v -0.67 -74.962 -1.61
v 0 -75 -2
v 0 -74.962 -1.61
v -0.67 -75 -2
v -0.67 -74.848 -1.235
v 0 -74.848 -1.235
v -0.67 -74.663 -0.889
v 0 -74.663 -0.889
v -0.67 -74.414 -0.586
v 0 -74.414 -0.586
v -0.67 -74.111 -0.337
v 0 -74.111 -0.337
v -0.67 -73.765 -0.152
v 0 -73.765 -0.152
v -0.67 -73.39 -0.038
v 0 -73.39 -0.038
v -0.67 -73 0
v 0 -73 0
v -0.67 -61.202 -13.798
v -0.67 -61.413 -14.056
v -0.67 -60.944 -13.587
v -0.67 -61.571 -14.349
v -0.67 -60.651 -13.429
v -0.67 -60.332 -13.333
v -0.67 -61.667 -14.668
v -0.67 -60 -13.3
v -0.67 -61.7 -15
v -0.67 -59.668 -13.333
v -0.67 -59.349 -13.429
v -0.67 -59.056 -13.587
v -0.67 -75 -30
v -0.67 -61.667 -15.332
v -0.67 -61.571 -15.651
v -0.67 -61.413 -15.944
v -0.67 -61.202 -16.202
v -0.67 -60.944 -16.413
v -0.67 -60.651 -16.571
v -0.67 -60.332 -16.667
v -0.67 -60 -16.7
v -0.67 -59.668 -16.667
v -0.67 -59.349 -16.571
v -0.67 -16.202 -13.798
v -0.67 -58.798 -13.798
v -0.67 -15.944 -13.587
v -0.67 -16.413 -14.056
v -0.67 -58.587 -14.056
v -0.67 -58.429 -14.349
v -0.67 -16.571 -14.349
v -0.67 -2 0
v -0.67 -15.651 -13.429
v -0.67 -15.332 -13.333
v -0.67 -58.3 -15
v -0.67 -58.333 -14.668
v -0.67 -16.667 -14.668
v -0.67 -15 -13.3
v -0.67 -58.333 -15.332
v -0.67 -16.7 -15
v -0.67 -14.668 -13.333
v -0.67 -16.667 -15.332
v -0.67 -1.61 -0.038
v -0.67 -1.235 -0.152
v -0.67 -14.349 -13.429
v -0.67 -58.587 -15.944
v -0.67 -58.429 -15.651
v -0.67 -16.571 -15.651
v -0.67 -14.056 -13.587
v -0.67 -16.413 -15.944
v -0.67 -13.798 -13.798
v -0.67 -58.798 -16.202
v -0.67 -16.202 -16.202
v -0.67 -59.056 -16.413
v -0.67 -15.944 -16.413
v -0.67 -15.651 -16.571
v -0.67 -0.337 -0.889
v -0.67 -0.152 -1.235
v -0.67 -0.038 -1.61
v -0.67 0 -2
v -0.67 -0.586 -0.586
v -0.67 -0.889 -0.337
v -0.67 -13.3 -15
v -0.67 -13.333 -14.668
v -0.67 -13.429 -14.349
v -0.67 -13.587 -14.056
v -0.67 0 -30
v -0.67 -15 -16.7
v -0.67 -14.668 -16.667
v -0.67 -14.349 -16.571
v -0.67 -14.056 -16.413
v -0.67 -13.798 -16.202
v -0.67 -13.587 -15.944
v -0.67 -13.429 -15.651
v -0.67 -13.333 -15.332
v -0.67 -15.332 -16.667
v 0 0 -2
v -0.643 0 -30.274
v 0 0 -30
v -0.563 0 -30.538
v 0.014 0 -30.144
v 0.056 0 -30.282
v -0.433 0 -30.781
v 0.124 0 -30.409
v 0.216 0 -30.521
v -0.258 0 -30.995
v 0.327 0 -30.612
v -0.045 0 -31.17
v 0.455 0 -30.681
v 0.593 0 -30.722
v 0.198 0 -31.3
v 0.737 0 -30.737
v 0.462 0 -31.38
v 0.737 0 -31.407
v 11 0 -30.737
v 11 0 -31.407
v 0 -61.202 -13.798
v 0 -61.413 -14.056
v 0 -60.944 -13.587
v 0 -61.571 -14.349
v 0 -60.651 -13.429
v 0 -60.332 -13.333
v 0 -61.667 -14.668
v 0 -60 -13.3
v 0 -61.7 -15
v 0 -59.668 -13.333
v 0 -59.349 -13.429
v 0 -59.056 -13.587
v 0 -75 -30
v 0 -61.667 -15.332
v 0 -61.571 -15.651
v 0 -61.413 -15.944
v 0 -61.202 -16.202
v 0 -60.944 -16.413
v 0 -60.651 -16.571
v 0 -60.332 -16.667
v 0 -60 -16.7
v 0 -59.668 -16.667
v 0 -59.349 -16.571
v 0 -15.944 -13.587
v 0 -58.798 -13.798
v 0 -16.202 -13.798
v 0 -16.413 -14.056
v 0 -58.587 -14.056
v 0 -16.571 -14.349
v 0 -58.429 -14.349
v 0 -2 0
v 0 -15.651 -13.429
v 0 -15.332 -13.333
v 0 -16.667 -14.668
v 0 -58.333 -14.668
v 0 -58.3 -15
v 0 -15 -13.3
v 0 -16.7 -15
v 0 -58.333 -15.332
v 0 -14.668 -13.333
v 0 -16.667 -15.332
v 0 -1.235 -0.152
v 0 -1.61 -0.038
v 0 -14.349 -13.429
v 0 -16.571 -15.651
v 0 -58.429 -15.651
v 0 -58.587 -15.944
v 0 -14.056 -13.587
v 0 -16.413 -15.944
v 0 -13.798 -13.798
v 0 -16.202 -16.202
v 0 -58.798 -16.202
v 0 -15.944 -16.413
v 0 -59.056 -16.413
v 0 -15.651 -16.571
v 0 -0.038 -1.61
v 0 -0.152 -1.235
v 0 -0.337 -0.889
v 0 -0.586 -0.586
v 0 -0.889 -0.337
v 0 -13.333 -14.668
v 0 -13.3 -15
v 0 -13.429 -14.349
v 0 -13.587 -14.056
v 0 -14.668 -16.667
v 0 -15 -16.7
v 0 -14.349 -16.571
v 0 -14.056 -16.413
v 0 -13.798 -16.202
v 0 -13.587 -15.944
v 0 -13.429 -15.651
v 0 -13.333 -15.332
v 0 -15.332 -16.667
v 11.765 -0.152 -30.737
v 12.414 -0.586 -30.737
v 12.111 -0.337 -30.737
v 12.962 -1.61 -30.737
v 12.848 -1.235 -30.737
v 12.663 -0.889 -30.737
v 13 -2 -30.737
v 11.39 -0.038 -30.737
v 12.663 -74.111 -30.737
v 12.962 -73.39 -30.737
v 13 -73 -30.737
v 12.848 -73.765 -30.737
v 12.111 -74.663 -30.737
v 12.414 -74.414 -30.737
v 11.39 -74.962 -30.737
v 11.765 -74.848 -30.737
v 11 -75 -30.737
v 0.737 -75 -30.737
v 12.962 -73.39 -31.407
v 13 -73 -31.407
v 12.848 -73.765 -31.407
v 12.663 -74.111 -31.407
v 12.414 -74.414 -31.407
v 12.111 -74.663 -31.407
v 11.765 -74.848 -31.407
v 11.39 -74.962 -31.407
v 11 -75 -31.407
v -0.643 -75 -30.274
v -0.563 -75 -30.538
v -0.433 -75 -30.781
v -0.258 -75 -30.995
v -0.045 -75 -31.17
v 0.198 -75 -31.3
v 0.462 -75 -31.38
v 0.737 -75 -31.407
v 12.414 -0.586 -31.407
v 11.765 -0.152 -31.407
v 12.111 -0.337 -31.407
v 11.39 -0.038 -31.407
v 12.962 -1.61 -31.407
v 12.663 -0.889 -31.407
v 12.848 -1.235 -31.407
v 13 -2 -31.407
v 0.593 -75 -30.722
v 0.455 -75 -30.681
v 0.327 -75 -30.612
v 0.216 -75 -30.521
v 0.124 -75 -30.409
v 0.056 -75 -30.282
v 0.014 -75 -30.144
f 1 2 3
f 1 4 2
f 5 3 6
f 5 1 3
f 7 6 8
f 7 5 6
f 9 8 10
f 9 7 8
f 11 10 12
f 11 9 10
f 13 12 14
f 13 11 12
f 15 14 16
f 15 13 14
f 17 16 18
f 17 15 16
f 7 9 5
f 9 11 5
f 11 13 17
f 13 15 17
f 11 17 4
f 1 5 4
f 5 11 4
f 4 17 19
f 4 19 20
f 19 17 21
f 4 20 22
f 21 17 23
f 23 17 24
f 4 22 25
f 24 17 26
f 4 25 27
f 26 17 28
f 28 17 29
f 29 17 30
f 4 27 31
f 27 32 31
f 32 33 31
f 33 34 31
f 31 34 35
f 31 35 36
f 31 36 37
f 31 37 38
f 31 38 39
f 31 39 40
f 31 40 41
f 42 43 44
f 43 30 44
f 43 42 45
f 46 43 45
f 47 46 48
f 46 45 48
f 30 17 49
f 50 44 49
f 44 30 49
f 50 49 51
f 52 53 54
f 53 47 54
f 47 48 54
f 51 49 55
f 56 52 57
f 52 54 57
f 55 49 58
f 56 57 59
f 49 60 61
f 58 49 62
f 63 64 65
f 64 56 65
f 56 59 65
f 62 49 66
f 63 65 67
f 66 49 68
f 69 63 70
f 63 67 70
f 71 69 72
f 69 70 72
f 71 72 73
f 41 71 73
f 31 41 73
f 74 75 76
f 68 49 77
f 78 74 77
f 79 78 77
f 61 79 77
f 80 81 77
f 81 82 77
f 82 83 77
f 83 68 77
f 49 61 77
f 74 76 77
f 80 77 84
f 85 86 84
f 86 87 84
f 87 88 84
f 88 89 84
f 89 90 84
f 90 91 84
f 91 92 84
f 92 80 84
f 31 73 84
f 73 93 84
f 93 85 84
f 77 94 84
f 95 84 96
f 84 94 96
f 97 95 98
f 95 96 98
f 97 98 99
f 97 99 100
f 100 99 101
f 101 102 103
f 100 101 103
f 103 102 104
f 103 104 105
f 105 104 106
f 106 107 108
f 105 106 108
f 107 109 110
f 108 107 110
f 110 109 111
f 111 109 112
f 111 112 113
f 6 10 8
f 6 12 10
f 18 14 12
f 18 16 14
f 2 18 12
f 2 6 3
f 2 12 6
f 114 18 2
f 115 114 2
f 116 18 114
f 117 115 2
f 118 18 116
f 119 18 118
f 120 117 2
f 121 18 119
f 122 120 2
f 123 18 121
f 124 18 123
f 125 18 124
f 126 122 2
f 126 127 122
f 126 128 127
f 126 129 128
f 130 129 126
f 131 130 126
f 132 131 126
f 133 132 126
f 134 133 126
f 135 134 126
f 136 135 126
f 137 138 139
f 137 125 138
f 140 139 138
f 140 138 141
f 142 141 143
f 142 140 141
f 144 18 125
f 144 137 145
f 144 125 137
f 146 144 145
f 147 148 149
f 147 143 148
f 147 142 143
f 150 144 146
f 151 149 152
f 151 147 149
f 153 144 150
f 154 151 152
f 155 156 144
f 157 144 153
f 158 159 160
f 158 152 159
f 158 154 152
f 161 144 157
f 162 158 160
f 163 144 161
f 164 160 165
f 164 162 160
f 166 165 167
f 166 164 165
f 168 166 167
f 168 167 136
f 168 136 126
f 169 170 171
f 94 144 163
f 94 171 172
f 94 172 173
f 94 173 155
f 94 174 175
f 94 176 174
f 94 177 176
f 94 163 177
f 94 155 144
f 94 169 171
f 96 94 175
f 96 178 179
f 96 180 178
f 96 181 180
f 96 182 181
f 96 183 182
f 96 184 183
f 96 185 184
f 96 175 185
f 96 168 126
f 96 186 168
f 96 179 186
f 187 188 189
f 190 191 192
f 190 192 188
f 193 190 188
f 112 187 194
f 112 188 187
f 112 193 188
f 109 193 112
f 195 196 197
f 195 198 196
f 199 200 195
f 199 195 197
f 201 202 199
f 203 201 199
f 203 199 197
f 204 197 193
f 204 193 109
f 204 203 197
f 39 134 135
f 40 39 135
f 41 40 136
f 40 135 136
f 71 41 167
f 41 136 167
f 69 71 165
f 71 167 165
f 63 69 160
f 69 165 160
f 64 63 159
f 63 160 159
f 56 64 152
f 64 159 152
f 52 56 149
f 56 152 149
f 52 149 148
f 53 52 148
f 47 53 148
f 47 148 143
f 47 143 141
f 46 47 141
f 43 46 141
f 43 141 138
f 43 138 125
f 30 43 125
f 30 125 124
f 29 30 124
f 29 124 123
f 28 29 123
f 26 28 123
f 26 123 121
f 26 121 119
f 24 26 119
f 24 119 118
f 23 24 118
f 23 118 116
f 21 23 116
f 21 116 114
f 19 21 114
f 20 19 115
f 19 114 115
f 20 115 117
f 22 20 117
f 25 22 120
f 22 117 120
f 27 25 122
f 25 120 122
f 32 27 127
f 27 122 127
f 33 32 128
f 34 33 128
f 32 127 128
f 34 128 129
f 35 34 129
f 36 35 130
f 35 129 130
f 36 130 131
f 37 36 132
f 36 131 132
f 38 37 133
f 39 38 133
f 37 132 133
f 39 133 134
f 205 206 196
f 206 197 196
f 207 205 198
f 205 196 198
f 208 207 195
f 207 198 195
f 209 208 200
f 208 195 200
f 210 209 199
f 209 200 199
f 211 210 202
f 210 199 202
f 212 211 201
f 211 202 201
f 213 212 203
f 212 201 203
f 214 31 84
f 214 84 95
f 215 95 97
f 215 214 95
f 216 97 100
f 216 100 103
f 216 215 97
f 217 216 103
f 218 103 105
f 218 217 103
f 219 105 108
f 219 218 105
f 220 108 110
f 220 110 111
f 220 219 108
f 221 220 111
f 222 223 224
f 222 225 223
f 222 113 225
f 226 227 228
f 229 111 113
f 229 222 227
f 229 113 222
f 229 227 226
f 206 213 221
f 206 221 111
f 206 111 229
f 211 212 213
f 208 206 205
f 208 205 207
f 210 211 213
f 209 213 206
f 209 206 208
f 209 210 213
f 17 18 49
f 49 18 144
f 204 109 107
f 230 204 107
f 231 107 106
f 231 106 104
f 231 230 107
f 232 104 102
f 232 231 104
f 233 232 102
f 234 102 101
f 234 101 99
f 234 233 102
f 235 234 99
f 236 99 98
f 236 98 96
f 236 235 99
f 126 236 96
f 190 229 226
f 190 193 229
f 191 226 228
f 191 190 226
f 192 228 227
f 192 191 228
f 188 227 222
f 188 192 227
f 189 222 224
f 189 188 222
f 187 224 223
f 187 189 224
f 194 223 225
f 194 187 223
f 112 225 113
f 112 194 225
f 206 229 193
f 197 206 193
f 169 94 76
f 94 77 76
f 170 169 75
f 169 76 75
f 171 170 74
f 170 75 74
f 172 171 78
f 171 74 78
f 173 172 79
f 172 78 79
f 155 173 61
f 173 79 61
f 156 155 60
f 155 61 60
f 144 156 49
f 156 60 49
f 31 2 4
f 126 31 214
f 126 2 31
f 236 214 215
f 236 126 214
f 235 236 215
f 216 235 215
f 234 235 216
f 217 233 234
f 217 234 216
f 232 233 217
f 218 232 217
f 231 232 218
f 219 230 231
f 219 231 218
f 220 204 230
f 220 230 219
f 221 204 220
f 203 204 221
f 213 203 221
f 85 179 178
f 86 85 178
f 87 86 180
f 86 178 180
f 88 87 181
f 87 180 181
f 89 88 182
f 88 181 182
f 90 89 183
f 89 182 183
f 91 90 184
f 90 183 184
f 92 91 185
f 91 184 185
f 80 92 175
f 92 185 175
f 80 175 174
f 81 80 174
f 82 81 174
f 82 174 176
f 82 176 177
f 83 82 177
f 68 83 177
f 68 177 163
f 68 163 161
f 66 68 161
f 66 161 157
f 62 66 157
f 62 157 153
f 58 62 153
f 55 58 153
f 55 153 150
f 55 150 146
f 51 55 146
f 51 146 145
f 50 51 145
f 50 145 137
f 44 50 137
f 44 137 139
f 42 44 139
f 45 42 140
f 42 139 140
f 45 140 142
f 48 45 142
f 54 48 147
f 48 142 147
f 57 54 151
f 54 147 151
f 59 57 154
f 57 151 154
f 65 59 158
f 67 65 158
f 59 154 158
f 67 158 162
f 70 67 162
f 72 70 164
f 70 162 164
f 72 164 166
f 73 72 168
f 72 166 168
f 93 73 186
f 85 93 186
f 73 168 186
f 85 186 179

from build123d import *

# Parameters (mm, degrees)
SKETCH1_W          = 30
SKETCH1_H          = 75
BASE_FLANGE1_DEPTH = 0.67
EDGE_FLANGE1_DEPTH = 75
SKETCH7_R          = 1.7
CUT_EXTRUDE1_DEPTH = 10
FILLET1_R          = 2


# Sheet-metal steps are written as plain solids
with BuildPart() as part:
    # Sketch1 → Base-Flange1 (new body)
    with BuildSketch(Plane(origin=(0, 0, 0), x_dir=(0, 0, -1), z_dir=(1, 0, 0))):
        with Locations((15, -37.5)):
            Rectangle(SKETCH1_W, SKETCH1_H)
    extrude(amount=-BASE_FLANGE1_DEPTH)

    # Edge-Flange1 section (across the edge) → Edge-Flange1 (add)
    with BuildSketch(Plane(origin=(0, -75, -30.7366), x_dir=(0, 0, 1), z_dir=(0, 1, 0))):
        with BuildLine():
            Line((-0.67, 0.7366), (-0.67, 13))
            Line((-0.67, 13), (0, 13))
            Line((0, 13), (0, 0.7366))
            ThreePointArc((0, 0.7366), (0.215745145, 0.215745145), (0.7366, 0))
            Line((0.7366, 0), (0.7366, -0.67))
            ThreePointArc((0.7366, -0.67), (-0.258016398, -0.258016398), (-0.67, 0.7366))
        make_face()
    extrude(amount=EDGE_FLANGE1_DEPTH)

    # Sketch7 → Cut-Extrude1 (cut)
    with BuildSketch(Plane(origin=(0, 0, 0), x_dir=(0, 0, -1), z_dir=(1, 0, 0))):
        with Locations((15, -60)):
            Circle(SKETCH7_R)
        with Locations((15, -15)):
            Circle(SKETCH7_R)
    extrude(amount=-CUT_EXTRUDE1_DEPTH, mode=Mode.SUBTRACT)

    # Fillet1
    fillet1_edges = [part.edges().sort_by_distance(p)[0] for p in [
        (13, -75, -31.0716),
        (13, 0, -31.0716),
        (-0.335, 0, 0),
        (-0.335, -75, 0),
    ]]
    fillet(fillet1_edges, radius=FILLET1_R)


solid = part.part
